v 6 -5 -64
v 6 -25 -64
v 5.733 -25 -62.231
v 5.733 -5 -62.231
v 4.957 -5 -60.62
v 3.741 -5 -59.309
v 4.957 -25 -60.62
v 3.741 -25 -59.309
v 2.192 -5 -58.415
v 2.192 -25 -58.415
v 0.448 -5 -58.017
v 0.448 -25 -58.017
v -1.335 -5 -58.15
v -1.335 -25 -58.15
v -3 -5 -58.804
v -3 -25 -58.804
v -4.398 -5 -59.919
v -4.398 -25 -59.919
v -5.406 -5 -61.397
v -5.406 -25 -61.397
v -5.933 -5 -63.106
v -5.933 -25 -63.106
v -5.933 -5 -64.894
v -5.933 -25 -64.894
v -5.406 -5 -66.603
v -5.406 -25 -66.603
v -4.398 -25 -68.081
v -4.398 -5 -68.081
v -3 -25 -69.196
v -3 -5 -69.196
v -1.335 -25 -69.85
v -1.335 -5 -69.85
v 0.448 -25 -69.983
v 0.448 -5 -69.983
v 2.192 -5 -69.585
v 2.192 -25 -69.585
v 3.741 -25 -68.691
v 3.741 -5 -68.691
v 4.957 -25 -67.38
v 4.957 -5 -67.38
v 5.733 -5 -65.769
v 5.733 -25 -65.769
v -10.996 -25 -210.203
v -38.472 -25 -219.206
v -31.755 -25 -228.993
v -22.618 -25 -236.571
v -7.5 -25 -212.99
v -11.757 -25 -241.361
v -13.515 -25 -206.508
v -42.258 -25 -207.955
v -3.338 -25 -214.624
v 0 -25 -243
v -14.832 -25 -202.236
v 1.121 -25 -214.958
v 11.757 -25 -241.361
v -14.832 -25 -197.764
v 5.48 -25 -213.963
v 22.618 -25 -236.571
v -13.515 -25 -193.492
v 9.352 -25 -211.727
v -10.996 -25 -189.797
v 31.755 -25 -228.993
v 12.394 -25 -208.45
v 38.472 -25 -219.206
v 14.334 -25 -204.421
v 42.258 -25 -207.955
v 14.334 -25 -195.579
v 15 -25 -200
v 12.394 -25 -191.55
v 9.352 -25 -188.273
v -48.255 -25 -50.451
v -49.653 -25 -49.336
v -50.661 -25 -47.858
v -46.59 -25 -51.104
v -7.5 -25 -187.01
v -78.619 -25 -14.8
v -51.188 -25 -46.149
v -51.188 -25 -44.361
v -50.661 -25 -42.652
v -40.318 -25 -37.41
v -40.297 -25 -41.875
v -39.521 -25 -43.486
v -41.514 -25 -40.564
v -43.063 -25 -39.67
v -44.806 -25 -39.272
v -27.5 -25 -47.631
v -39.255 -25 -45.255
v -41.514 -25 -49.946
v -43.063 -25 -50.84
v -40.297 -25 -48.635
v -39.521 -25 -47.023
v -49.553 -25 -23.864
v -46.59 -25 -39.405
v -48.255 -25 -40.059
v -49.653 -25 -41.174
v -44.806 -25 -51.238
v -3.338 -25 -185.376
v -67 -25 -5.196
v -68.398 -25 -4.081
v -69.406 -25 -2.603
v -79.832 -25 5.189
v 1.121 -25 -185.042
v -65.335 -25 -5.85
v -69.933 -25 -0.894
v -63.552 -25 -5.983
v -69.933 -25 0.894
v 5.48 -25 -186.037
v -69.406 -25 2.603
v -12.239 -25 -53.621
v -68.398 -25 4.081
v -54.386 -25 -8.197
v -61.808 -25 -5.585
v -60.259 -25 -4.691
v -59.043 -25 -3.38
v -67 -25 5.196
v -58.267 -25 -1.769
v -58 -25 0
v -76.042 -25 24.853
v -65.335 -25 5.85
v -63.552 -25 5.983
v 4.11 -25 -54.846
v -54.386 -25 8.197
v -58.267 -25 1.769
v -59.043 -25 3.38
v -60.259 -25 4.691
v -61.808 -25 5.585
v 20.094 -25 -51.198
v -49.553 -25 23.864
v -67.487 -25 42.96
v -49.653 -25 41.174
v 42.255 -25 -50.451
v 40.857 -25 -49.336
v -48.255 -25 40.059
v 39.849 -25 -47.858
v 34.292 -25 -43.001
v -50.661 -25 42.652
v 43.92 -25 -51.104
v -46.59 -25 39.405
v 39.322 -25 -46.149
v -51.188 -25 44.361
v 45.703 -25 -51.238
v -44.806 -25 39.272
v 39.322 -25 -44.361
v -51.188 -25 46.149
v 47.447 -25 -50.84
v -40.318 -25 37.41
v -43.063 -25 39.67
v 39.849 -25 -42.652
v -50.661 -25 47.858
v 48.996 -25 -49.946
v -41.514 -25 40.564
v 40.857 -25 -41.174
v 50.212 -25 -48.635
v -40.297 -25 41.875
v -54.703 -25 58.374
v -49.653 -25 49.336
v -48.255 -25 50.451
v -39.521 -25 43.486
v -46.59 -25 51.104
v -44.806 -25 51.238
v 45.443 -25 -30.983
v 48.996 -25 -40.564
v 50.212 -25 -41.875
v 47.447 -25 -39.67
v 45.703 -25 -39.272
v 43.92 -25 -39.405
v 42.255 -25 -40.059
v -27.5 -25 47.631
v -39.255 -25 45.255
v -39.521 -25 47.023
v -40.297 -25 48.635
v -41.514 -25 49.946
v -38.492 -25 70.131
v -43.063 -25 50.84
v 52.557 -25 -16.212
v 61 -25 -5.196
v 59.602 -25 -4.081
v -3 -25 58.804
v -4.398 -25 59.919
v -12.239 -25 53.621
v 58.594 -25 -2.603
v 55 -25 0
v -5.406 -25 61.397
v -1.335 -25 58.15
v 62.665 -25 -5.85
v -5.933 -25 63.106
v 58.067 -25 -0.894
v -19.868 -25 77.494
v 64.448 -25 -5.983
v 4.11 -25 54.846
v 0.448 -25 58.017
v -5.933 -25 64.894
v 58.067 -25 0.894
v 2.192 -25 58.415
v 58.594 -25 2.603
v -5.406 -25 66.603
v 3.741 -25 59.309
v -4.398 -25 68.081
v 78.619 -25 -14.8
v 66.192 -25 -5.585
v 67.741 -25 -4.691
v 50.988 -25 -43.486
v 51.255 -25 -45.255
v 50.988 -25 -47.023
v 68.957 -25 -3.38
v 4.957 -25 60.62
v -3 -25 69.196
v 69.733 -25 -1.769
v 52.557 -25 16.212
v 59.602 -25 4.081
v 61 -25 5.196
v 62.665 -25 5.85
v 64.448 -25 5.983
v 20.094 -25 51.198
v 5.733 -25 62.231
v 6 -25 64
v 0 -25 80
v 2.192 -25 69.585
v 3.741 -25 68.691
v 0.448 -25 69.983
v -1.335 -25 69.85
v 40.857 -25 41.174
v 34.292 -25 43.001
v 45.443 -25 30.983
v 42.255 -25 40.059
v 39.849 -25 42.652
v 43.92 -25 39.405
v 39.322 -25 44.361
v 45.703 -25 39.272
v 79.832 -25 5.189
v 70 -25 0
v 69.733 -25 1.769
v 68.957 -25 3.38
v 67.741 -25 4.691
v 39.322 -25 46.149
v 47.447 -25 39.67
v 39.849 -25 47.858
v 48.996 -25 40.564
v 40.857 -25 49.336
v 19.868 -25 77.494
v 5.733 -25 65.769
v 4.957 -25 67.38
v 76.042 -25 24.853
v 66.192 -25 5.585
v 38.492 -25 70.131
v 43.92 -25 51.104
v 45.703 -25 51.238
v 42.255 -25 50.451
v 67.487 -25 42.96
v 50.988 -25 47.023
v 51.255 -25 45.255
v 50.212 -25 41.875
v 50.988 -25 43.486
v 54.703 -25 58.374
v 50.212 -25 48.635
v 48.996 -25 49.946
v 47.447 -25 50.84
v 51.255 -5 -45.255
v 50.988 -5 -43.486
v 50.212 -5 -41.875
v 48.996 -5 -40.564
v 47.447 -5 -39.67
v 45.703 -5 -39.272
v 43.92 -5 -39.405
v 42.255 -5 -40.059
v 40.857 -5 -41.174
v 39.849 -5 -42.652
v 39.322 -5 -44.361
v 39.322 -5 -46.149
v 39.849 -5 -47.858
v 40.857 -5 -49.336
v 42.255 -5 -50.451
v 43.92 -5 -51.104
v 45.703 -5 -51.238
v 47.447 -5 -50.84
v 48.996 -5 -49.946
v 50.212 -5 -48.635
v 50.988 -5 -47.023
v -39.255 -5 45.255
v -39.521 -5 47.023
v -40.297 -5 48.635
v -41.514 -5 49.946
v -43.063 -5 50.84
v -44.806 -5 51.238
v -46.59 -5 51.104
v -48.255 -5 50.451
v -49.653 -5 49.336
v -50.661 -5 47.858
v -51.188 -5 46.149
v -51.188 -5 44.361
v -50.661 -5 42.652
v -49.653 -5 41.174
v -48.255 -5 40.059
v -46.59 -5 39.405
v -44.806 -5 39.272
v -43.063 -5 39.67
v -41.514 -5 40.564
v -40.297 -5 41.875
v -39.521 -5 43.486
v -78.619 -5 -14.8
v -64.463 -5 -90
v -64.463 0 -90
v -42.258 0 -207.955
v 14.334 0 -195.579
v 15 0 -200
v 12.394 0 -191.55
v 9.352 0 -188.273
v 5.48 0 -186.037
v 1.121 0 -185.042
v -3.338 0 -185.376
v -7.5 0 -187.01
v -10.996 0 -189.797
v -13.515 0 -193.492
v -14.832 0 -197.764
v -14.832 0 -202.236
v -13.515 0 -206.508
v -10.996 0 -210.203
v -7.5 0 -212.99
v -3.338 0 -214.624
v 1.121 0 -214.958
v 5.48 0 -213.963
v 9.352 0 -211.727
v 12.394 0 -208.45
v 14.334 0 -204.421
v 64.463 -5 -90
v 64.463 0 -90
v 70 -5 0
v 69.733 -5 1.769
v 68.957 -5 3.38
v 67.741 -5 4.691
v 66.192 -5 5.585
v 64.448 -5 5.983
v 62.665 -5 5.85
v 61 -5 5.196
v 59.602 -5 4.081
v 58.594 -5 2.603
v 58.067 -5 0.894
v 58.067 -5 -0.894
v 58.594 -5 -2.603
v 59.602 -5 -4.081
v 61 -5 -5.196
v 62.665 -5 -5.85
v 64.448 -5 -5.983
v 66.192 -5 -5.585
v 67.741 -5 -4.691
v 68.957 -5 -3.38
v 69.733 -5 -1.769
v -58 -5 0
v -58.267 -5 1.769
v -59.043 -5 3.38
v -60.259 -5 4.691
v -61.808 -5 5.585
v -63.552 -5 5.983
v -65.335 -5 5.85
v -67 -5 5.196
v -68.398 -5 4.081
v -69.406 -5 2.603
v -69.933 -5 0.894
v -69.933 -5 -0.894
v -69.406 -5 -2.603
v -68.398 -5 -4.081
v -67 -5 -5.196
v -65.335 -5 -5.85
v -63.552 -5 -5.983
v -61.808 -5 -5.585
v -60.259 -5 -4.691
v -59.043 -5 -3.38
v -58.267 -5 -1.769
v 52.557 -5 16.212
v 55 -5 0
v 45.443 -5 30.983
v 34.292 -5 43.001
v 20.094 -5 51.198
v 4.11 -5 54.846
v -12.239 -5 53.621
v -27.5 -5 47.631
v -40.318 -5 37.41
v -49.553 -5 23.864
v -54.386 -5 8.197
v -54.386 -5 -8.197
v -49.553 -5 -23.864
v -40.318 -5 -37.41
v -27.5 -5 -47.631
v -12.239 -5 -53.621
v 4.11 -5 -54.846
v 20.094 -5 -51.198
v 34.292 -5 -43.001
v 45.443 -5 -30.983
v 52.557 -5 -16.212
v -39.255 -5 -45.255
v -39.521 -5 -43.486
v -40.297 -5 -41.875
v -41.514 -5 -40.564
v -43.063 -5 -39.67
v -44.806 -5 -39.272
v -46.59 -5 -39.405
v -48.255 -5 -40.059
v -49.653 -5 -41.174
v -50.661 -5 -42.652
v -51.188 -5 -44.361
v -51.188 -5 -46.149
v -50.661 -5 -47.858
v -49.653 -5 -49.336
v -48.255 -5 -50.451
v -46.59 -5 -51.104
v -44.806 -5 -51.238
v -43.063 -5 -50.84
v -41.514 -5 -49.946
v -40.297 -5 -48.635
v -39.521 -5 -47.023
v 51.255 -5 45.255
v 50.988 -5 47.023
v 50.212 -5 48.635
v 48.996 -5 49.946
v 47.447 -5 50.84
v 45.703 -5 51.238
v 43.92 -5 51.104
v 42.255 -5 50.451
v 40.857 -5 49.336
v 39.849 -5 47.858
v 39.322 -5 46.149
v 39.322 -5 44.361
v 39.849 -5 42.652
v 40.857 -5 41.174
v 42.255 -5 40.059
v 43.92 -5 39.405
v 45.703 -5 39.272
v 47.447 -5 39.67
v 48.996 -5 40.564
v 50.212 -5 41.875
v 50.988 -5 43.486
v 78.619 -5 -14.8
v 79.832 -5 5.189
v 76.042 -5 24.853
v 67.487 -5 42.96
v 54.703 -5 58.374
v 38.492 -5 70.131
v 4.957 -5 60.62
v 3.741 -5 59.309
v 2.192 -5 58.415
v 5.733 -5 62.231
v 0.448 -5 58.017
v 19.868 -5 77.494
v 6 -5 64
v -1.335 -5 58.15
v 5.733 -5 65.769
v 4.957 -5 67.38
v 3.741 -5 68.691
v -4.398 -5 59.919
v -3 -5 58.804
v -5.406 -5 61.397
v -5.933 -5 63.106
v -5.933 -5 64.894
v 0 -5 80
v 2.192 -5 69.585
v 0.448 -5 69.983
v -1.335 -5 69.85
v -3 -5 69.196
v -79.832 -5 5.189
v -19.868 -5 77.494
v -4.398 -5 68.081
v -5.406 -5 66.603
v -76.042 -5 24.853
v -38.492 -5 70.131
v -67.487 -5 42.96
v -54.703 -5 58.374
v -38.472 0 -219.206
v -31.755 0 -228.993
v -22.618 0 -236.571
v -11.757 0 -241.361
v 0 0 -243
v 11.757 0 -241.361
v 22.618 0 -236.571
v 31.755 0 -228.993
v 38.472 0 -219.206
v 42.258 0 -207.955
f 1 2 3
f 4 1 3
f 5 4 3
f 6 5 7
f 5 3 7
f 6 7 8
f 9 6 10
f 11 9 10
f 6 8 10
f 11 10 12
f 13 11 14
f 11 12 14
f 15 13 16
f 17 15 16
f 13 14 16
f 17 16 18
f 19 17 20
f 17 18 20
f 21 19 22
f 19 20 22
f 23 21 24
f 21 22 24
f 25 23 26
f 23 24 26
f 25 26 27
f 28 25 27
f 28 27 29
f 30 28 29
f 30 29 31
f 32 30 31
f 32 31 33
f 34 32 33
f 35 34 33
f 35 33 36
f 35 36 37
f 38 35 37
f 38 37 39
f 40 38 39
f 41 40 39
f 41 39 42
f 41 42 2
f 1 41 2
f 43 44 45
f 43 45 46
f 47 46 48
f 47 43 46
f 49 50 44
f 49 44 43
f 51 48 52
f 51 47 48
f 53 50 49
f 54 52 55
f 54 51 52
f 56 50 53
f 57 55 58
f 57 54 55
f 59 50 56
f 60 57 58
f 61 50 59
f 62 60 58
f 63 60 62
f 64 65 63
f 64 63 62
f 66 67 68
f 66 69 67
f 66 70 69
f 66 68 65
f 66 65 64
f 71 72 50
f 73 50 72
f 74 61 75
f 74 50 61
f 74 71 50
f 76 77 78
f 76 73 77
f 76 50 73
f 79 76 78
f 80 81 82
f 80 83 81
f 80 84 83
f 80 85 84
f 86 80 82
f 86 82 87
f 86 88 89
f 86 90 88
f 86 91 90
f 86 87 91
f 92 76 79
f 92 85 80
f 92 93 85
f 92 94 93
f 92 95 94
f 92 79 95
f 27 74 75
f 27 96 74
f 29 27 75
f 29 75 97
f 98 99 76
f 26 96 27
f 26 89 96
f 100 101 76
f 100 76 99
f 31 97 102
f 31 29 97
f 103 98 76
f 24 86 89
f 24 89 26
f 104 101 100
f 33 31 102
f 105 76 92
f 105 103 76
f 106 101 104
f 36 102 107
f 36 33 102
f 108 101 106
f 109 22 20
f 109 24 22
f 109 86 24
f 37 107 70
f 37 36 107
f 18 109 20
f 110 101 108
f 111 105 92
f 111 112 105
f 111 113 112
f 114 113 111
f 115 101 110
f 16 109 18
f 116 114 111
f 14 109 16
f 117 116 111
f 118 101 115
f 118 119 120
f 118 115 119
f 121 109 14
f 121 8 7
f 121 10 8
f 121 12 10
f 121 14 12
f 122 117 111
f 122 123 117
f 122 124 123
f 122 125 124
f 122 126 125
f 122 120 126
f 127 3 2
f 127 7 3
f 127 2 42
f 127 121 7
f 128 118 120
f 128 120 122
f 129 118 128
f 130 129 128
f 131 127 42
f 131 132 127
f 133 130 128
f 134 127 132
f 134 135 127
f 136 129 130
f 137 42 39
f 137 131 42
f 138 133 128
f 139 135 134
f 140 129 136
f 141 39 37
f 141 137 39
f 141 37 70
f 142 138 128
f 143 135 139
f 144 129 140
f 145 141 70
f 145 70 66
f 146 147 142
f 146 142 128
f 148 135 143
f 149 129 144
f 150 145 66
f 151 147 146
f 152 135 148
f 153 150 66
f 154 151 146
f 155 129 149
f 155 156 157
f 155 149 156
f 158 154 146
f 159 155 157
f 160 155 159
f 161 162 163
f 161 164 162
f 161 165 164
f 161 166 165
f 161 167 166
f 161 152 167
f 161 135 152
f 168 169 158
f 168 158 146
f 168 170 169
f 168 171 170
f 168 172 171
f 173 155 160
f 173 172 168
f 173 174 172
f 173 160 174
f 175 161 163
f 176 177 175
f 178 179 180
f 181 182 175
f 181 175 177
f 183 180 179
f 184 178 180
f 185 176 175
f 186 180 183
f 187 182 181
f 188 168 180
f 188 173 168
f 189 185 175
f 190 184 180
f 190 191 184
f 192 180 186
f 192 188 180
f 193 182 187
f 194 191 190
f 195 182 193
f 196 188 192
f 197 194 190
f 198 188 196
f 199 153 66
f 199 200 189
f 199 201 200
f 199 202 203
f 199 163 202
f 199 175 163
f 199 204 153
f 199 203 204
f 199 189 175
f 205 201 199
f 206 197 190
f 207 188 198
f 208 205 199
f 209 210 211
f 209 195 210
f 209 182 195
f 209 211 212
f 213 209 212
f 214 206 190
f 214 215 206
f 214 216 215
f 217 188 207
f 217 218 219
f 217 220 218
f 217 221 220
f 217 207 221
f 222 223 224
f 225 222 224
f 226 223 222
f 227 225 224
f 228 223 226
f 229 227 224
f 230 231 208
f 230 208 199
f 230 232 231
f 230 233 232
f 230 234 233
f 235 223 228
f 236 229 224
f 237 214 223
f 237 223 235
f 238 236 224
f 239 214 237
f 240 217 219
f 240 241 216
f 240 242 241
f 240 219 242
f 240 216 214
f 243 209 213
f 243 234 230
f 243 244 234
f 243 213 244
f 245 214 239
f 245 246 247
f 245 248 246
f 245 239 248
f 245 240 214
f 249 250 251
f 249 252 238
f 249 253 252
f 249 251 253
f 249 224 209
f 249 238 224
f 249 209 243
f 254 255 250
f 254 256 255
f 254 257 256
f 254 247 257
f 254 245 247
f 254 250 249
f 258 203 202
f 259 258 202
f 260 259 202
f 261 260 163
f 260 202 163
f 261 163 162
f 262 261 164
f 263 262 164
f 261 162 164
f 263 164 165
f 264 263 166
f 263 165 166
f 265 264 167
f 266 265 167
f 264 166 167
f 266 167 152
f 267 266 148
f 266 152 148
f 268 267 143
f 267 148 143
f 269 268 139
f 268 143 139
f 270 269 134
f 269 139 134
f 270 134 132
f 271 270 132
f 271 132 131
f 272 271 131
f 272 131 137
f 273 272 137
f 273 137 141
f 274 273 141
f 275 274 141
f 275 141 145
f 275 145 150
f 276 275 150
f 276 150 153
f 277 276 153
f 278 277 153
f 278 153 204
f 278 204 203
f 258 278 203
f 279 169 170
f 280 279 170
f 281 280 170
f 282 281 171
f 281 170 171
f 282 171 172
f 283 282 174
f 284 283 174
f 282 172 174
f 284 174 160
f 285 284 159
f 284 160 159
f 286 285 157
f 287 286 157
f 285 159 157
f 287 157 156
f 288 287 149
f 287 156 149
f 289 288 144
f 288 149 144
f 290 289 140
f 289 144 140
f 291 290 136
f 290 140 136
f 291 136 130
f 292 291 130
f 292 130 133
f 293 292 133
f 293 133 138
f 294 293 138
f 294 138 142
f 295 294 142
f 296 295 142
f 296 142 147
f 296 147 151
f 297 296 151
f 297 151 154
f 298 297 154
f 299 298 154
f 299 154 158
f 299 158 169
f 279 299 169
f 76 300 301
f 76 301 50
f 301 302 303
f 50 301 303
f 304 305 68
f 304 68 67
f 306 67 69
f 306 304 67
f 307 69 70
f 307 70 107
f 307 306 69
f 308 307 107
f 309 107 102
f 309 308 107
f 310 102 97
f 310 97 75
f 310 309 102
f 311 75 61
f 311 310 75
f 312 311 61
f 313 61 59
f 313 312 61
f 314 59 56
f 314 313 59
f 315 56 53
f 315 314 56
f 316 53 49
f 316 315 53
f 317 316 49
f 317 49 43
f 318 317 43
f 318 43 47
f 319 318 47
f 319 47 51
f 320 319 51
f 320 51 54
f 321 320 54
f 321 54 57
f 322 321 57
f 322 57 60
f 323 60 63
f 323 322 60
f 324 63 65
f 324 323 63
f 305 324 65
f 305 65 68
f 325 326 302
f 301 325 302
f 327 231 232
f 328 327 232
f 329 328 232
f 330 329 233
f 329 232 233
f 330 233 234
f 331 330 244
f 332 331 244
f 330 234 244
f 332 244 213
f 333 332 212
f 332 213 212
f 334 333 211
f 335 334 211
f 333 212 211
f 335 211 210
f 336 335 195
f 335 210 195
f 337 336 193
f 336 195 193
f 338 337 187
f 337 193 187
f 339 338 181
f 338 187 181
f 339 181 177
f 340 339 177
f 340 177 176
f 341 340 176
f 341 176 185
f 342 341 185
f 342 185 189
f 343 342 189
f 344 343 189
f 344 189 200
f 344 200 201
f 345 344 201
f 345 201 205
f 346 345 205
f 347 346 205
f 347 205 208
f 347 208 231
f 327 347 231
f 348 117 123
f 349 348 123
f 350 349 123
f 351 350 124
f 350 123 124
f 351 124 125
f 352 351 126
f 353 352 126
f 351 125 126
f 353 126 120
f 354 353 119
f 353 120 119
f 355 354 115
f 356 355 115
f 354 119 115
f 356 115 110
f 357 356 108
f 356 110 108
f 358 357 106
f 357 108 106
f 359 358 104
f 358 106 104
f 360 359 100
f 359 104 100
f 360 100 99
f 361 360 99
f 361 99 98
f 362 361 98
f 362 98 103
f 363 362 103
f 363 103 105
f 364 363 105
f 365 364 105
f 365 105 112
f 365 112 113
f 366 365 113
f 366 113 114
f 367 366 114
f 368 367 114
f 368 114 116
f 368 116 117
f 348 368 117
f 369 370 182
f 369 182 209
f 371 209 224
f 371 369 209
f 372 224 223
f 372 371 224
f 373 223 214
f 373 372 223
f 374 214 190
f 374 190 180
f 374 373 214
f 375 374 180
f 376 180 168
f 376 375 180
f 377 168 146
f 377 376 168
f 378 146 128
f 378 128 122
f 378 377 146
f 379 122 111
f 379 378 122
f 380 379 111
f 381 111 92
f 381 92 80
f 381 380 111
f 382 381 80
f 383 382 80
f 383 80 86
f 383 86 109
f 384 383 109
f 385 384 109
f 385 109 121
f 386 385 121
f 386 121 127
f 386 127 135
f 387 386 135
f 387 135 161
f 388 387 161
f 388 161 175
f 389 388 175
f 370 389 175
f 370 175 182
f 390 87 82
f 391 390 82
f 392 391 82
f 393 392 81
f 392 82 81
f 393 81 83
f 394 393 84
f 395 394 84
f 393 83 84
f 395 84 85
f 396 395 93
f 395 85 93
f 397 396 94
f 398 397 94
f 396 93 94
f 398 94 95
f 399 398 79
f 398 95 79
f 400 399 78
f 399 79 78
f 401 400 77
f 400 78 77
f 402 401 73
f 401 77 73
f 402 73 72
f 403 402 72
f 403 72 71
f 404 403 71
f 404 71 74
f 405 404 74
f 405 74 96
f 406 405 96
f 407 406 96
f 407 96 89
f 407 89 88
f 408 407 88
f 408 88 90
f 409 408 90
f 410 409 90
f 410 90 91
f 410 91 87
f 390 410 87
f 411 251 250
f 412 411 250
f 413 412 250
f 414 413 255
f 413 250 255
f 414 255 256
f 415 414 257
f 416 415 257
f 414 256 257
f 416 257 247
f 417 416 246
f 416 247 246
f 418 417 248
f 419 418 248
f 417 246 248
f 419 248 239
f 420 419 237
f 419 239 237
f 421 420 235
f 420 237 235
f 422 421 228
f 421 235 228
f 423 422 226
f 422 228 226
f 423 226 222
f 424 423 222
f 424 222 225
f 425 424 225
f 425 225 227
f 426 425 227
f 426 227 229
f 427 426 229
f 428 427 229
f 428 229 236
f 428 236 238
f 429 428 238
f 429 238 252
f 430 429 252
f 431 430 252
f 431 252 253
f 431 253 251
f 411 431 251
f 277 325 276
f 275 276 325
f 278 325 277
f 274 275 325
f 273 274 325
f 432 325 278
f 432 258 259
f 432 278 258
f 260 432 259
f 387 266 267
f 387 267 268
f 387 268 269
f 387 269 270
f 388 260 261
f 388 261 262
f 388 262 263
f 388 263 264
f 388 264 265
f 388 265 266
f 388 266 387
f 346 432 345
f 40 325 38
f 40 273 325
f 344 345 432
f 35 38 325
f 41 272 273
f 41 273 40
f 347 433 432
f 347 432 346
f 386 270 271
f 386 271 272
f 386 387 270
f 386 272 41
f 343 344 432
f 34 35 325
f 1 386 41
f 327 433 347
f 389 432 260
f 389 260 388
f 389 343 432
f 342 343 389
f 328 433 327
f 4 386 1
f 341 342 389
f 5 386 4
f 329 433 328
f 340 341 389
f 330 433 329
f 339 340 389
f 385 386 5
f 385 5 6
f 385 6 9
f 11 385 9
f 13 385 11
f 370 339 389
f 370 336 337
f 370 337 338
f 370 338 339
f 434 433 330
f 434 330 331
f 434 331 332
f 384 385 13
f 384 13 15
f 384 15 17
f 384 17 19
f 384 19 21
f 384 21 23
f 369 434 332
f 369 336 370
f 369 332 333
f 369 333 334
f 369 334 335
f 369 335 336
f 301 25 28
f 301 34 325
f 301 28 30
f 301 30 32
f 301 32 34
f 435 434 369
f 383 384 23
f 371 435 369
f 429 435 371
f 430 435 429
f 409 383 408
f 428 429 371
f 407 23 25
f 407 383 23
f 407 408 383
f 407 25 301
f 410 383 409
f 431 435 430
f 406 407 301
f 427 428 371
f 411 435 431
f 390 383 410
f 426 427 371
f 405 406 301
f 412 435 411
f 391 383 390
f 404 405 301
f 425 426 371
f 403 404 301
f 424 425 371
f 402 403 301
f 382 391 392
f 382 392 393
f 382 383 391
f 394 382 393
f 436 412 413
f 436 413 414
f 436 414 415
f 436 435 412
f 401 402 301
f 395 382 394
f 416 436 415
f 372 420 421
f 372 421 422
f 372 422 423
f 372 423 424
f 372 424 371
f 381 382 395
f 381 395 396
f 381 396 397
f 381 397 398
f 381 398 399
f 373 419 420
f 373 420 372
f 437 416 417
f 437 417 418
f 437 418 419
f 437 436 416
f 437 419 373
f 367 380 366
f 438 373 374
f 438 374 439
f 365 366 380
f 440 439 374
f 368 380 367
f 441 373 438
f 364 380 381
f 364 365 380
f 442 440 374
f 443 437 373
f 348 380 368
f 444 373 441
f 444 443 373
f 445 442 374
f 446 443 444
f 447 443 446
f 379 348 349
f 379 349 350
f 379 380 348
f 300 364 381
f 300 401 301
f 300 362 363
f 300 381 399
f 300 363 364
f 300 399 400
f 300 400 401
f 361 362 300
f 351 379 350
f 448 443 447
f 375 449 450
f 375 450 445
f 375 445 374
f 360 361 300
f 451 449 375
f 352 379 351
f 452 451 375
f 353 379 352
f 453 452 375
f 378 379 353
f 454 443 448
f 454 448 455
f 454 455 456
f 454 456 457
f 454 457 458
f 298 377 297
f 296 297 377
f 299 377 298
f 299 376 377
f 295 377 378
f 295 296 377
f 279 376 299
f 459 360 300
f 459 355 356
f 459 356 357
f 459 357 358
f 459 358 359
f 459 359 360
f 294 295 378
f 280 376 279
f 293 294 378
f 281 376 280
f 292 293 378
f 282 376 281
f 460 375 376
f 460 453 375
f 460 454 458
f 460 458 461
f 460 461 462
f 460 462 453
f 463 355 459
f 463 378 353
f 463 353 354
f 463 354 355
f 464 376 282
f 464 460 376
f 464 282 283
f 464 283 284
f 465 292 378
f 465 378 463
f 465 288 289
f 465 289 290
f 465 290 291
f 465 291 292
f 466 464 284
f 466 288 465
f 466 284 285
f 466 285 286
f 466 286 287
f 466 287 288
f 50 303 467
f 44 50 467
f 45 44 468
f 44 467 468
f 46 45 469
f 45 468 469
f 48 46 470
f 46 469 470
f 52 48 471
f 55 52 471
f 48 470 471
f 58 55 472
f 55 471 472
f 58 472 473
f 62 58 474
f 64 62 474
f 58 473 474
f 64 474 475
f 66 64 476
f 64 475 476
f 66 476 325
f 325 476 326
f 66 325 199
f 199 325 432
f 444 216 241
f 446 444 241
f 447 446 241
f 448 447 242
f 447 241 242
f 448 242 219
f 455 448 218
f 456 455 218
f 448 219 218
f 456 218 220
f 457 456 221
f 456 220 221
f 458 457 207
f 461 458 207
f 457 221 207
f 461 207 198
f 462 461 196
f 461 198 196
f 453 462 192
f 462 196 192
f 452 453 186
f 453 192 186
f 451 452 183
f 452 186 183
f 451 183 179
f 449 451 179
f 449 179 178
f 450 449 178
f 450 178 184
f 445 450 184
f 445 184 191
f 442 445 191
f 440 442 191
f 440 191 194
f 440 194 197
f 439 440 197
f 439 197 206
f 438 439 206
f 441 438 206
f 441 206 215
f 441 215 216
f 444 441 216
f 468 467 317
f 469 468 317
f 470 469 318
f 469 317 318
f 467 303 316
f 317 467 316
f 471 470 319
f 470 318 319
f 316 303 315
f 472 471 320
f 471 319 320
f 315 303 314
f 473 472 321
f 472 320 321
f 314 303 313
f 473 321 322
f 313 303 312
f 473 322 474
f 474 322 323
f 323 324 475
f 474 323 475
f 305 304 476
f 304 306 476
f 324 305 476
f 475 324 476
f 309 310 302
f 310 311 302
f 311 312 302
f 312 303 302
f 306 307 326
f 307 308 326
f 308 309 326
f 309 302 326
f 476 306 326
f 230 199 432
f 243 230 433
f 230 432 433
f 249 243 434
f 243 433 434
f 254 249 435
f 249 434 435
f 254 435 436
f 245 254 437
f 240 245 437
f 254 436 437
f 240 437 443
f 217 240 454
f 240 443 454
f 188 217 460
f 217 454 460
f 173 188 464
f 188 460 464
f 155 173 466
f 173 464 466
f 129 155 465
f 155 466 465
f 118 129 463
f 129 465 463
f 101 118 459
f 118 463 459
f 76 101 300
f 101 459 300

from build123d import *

# Parameters (mm, degrees)
F0_R     = 15
F0_R_2   = 55
F1_DEPTH = 25
F2_R     = 55
F3_DEPTH = 5
F4_R     = 6
F5_DEPTH = 25


with BuildPart() as f1:
    # F0 (on Front) → F1 (new body)
    with BuildSketch(Plane.XZ):
        with BuildLine():
            ThreePointArc((78.619082, -14.8), (0, 80), (-78.619082, -14.8))
            Line((-78.619082, -14.8), (-42.257756, -207.955))
            ThreePointArc((-42.257756, -207.955), (0, -243), (42.257756, -207.955))
            Line((42.257756, -207.955), (78.619082, -14.8))
        make_face()
        with Locations((0, -200)):
            Circle(F0_R, mode=Mode.SUBTRACT)
        Circle(F0_R_2, mode=Mode.SUBTRACT)
    extrude(amount=F1_DEPTH)

    # F2 (on face) → F3 (cut)
    with BuildSketch(Plane(origin=(0, 0, 0), x_dir=(-1, 0, 0), z_dir=(0, 1, 0))):
        with BuildLine():
            Line((-78.619082, -14.8), (-64.462722, -90))
            Line((-64.462722, -90), (64.462722, -90))
            Line((64.462722, -90), (78.619082, -14.8))
            ThreePointArc((78.619082, -14.8), (0, 80), (-78.619082, -14.8))
        make_face()
        Circle(F2_R, mode=Mode.SUBTRACT)
    extrude(amount=-F3_DEPTH, mode=Mode.SUBTRACT)

    # F4 (on face) → F5 (cut)
    with BuildSketch(Plane.XZ.offset(25)):
        with Locations((0, 64)):
            Circle(F4_R)
        with Locations((45.254834, 45.254834)):
            Circle(F4_R)
        with Locations((64, 0)):
            Circle(F4_R)
        with Locations((45.254834, -45.254834)):
            Circle(F4_R)
        with Locations((0, -64)):
            Circle(F4_R)
        with Locations((-45.254834, -45.254834)):
            Circle(F4_R)
        with Locations((-64, 0)):
            Circle(F4_R)
        with Locations((-45.254834, 45.254834)):
            Circle(F4_R)
    extrude(amount=-F5_DEPTH, mode=Mode.SUBTRACT)


solid = f1.part
